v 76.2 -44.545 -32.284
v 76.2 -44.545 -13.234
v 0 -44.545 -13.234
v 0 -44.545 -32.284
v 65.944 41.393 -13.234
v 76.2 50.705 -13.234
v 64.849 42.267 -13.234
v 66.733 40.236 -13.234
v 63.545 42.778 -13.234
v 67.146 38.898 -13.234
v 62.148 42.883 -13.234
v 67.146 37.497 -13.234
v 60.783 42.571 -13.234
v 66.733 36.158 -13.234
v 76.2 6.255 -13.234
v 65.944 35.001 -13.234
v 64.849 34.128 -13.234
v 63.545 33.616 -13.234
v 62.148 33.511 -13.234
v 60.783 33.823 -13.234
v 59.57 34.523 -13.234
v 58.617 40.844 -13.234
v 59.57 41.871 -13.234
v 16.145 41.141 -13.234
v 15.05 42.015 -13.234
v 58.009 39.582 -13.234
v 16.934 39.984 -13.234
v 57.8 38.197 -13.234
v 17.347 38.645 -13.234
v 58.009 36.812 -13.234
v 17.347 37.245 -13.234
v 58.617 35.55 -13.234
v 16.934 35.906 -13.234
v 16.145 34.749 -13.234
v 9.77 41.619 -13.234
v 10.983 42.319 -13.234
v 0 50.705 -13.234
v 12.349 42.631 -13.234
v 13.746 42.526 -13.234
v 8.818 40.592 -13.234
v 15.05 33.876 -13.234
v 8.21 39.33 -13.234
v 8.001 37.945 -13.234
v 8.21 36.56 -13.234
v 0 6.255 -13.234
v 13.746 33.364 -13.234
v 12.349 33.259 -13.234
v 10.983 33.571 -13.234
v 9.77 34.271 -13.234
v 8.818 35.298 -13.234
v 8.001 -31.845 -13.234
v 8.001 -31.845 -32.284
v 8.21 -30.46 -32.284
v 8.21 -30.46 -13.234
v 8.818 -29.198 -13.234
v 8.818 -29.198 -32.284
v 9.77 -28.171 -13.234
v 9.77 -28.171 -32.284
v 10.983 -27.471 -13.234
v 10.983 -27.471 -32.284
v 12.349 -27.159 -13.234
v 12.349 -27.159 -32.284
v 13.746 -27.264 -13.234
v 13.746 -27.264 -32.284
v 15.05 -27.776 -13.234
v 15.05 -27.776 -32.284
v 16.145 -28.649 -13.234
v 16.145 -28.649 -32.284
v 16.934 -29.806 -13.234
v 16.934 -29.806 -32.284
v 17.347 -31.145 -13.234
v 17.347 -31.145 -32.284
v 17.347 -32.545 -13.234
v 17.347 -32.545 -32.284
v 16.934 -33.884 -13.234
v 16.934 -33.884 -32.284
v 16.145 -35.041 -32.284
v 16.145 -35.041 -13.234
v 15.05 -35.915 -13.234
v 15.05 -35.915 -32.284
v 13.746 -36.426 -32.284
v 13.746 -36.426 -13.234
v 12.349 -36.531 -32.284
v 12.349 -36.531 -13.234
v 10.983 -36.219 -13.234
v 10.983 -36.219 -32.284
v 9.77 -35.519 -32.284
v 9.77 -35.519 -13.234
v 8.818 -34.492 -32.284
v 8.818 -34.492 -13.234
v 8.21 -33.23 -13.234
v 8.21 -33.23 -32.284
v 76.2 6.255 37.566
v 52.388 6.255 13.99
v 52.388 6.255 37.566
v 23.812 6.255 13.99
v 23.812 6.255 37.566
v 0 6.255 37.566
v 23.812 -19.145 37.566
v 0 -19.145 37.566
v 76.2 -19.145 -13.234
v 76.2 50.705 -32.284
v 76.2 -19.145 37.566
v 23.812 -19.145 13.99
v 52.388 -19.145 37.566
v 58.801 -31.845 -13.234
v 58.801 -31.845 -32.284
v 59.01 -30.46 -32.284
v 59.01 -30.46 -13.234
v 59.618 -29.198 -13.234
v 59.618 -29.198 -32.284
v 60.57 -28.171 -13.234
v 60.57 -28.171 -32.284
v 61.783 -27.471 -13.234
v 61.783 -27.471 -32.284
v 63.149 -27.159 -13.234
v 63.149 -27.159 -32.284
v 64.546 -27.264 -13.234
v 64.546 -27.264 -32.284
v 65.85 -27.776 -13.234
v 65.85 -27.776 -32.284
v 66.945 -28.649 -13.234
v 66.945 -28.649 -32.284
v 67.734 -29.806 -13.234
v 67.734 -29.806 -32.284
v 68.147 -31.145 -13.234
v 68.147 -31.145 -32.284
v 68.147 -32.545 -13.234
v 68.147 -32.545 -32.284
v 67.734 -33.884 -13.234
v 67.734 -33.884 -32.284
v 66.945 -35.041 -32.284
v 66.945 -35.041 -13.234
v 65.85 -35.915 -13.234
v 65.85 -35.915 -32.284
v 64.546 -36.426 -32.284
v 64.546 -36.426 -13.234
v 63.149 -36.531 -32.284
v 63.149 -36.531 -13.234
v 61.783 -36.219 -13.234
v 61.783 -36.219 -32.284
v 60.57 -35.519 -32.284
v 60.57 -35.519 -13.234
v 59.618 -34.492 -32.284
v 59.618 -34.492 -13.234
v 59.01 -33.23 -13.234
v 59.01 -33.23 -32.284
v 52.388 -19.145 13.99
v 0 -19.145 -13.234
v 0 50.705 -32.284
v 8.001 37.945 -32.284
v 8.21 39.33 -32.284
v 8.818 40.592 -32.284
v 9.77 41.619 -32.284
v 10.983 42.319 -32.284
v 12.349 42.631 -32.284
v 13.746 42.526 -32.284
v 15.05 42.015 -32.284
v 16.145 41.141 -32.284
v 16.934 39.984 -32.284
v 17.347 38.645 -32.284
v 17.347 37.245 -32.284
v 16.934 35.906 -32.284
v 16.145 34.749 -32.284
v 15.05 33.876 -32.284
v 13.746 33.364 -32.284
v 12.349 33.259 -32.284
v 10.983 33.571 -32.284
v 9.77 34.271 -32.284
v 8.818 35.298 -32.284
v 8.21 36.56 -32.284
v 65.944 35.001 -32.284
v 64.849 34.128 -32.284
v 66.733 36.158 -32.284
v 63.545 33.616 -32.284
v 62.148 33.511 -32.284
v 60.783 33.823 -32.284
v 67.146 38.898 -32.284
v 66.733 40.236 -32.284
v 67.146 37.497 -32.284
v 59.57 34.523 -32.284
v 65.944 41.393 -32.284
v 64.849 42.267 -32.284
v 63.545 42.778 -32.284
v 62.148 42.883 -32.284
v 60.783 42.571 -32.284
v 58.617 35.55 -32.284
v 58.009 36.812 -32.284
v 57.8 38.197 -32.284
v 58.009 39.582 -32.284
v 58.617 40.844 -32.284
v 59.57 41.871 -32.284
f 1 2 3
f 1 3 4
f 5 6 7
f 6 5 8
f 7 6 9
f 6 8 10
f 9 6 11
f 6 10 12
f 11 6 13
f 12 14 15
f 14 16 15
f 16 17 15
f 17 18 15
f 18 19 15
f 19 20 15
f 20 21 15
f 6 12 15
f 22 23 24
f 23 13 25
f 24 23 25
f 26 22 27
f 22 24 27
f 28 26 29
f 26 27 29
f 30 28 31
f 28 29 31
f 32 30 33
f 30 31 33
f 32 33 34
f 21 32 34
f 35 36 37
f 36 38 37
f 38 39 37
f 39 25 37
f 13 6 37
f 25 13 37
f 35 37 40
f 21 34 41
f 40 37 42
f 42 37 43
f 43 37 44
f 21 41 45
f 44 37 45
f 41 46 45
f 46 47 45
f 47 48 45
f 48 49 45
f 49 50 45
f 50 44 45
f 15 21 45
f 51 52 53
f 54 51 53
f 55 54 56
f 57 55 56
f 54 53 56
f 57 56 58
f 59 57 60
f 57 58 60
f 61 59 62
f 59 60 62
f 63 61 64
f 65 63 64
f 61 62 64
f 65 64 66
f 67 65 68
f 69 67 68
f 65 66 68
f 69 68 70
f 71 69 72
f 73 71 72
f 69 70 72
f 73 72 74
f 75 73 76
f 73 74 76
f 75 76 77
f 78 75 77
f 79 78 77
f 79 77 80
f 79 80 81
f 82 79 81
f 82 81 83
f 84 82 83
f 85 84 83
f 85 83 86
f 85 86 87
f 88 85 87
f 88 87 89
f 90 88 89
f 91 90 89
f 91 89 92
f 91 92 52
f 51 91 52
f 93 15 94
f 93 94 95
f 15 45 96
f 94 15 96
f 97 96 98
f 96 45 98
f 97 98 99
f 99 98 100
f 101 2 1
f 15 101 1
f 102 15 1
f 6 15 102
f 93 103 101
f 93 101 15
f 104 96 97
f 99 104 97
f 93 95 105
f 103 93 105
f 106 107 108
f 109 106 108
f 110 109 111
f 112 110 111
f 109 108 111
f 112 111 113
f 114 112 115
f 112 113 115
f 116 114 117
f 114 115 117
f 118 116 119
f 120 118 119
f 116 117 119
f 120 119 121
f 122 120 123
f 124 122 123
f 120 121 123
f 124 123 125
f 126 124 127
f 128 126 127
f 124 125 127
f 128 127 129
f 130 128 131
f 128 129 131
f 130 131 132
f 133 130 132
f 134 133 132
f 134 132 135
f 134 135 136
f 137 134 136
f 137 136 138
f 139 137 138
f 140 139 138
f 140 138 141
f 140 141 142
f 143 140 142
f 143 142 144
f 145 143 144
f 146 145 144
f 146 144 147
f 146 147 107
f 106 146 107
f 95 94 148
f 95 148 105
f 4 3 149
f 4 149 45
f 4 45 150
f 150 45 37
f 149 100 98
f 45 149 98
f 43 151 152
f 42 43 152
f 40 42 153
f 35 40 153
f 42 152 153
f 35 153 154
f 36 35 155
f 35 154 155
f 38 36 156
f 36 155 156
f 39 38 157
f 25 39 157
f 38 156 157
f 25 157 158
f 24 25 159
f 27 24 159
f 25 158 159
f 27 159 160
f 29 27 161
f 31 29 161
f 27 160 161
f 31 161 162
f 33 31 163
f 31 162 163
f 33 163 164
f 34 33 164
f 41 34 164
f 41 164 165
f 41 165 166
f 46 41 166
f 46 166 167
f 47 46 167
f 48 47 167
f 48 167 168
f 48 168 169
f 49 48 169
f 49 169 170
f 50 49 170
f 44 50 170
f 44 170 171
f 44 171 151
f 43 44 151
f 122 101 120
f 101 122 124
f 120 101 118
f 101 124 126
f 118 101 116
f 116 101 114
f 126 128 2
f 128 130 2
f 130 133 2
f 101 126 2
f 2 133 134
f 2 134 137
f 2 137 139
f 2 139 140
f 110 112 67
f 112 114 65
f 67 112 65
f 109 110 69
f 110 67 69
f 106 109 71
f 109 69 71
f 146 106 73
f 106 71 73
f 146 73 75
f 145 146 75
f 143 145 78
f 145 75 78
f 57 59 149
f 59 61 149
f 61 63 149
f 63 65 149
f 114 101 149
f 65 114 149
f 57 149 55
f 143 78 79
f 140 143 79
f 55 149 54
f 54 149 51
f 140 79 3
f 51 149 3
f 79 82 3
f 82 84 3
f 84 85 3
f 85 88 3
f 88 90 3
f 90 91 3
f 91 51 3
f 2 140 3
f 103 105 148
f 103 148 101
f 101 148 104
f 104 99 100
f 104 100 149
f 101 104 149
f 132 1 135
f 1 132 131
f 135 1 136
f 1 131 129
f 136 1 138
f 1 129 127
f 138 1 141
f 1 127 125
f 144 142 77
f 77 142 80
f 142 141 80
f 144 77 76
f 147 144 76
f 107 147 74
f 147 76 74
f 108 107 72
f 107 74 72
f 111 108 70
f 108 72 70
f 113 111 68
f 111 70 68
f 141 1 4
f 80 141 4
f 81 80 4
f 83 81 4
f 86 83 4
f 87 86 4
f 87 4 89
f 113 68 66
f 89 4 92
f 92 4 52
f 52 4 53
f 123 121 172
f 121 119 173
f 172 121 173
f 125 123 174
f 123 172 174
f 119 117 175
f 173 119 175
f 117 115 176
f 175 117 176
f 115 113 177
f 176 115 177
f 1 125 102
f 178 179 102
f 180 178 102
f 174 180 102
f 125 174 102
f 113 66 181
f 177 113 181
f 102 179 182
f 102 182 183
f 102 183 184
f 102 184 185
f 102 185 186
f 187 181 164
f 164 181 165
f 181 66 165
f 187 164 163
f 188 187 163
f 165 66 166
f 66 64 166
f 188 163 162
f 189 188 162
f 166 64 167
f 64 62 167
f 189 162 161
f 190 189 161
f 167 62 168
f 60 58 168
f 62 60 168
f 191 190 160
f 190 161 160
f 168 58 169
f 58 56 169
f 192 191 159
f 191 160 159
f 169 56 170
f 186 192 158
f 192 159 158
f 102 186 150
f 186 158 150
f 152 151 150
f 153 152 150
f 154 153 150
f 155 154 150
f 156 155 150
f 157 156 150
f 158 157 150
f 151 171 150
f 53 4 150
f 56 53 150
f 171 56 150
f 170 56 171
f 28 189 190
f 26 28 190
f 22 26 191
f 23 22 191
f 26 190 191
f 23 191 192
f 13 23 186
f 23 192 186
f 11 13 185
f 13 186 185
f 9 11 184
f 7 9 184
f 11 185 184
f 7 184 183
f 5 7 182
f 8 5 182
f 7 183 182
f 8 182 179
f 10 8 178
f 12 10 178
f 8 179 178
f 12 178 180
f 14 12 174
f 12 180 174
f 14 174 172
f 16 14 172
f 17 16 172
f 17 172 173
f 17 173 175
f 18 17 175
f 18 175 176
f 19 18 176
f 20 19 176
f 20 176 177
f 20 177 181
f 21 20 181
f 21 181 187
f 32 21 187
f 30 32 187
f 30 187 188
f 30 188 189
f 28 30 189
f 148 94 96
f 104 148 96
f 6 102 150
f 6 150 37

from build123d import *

# Parameters (mm, degrees)
F1_DEPTH = 76.2
F2_W     = 28.575
F2_H     = 23.576327
F3_DEPTH = 50.801
F6_D     = 9.398
F8_D     = 9.398
F10_D    = 9.398


with BuildPart() as f1:
    # F0 (on Right) → F1 (new body)
    with BuildSketch(Plane.YZ):
        Polygon((-44.545047, -32.283712), (50.704953, -32.283712), (50.704953, -13.233712), (6.254953, -13.233712), (6.254953, 37.566288), (-19.145047, 37.566288), (-19.145047, -13.233712), (-44.545047, -13.233712), align=None)
    extrude(amount=F1_DEPTH)

    # F2 (on face) → F3 (cut, through all)
    with BuildSketch(Plane(origin=(0, 6.254953, 0), x_dir=(-1, 0, 0), z_dir=(0, 1, 0))):
        with Locations((-38.1, 25.778125)):
            Rectangle(F2_W, F2_H)
    extrude(amount=-F3_DEPTH, mode=Mode.SUBTRACT)

    # F6 (through all)
    with Locations(Plane.XY.offset(-13.233712)):
        with Locations((12.7, 37.945128)):
            Hole(F6_D / 2)

    # F8 (through all)
    with Locations(Plane.XY.offset(-13.233712)):
        with Locations((62.49947, 38.197309)):
            Hole(F8_D / 2)

    # F10 (through all)
    with Locations(Plane.XY.offset(-13.233712)):
        with Locations((12.7, -31.845047), (63.5, -31.845047)):
            Hole(F10_D / 2)


solid = f1.part
